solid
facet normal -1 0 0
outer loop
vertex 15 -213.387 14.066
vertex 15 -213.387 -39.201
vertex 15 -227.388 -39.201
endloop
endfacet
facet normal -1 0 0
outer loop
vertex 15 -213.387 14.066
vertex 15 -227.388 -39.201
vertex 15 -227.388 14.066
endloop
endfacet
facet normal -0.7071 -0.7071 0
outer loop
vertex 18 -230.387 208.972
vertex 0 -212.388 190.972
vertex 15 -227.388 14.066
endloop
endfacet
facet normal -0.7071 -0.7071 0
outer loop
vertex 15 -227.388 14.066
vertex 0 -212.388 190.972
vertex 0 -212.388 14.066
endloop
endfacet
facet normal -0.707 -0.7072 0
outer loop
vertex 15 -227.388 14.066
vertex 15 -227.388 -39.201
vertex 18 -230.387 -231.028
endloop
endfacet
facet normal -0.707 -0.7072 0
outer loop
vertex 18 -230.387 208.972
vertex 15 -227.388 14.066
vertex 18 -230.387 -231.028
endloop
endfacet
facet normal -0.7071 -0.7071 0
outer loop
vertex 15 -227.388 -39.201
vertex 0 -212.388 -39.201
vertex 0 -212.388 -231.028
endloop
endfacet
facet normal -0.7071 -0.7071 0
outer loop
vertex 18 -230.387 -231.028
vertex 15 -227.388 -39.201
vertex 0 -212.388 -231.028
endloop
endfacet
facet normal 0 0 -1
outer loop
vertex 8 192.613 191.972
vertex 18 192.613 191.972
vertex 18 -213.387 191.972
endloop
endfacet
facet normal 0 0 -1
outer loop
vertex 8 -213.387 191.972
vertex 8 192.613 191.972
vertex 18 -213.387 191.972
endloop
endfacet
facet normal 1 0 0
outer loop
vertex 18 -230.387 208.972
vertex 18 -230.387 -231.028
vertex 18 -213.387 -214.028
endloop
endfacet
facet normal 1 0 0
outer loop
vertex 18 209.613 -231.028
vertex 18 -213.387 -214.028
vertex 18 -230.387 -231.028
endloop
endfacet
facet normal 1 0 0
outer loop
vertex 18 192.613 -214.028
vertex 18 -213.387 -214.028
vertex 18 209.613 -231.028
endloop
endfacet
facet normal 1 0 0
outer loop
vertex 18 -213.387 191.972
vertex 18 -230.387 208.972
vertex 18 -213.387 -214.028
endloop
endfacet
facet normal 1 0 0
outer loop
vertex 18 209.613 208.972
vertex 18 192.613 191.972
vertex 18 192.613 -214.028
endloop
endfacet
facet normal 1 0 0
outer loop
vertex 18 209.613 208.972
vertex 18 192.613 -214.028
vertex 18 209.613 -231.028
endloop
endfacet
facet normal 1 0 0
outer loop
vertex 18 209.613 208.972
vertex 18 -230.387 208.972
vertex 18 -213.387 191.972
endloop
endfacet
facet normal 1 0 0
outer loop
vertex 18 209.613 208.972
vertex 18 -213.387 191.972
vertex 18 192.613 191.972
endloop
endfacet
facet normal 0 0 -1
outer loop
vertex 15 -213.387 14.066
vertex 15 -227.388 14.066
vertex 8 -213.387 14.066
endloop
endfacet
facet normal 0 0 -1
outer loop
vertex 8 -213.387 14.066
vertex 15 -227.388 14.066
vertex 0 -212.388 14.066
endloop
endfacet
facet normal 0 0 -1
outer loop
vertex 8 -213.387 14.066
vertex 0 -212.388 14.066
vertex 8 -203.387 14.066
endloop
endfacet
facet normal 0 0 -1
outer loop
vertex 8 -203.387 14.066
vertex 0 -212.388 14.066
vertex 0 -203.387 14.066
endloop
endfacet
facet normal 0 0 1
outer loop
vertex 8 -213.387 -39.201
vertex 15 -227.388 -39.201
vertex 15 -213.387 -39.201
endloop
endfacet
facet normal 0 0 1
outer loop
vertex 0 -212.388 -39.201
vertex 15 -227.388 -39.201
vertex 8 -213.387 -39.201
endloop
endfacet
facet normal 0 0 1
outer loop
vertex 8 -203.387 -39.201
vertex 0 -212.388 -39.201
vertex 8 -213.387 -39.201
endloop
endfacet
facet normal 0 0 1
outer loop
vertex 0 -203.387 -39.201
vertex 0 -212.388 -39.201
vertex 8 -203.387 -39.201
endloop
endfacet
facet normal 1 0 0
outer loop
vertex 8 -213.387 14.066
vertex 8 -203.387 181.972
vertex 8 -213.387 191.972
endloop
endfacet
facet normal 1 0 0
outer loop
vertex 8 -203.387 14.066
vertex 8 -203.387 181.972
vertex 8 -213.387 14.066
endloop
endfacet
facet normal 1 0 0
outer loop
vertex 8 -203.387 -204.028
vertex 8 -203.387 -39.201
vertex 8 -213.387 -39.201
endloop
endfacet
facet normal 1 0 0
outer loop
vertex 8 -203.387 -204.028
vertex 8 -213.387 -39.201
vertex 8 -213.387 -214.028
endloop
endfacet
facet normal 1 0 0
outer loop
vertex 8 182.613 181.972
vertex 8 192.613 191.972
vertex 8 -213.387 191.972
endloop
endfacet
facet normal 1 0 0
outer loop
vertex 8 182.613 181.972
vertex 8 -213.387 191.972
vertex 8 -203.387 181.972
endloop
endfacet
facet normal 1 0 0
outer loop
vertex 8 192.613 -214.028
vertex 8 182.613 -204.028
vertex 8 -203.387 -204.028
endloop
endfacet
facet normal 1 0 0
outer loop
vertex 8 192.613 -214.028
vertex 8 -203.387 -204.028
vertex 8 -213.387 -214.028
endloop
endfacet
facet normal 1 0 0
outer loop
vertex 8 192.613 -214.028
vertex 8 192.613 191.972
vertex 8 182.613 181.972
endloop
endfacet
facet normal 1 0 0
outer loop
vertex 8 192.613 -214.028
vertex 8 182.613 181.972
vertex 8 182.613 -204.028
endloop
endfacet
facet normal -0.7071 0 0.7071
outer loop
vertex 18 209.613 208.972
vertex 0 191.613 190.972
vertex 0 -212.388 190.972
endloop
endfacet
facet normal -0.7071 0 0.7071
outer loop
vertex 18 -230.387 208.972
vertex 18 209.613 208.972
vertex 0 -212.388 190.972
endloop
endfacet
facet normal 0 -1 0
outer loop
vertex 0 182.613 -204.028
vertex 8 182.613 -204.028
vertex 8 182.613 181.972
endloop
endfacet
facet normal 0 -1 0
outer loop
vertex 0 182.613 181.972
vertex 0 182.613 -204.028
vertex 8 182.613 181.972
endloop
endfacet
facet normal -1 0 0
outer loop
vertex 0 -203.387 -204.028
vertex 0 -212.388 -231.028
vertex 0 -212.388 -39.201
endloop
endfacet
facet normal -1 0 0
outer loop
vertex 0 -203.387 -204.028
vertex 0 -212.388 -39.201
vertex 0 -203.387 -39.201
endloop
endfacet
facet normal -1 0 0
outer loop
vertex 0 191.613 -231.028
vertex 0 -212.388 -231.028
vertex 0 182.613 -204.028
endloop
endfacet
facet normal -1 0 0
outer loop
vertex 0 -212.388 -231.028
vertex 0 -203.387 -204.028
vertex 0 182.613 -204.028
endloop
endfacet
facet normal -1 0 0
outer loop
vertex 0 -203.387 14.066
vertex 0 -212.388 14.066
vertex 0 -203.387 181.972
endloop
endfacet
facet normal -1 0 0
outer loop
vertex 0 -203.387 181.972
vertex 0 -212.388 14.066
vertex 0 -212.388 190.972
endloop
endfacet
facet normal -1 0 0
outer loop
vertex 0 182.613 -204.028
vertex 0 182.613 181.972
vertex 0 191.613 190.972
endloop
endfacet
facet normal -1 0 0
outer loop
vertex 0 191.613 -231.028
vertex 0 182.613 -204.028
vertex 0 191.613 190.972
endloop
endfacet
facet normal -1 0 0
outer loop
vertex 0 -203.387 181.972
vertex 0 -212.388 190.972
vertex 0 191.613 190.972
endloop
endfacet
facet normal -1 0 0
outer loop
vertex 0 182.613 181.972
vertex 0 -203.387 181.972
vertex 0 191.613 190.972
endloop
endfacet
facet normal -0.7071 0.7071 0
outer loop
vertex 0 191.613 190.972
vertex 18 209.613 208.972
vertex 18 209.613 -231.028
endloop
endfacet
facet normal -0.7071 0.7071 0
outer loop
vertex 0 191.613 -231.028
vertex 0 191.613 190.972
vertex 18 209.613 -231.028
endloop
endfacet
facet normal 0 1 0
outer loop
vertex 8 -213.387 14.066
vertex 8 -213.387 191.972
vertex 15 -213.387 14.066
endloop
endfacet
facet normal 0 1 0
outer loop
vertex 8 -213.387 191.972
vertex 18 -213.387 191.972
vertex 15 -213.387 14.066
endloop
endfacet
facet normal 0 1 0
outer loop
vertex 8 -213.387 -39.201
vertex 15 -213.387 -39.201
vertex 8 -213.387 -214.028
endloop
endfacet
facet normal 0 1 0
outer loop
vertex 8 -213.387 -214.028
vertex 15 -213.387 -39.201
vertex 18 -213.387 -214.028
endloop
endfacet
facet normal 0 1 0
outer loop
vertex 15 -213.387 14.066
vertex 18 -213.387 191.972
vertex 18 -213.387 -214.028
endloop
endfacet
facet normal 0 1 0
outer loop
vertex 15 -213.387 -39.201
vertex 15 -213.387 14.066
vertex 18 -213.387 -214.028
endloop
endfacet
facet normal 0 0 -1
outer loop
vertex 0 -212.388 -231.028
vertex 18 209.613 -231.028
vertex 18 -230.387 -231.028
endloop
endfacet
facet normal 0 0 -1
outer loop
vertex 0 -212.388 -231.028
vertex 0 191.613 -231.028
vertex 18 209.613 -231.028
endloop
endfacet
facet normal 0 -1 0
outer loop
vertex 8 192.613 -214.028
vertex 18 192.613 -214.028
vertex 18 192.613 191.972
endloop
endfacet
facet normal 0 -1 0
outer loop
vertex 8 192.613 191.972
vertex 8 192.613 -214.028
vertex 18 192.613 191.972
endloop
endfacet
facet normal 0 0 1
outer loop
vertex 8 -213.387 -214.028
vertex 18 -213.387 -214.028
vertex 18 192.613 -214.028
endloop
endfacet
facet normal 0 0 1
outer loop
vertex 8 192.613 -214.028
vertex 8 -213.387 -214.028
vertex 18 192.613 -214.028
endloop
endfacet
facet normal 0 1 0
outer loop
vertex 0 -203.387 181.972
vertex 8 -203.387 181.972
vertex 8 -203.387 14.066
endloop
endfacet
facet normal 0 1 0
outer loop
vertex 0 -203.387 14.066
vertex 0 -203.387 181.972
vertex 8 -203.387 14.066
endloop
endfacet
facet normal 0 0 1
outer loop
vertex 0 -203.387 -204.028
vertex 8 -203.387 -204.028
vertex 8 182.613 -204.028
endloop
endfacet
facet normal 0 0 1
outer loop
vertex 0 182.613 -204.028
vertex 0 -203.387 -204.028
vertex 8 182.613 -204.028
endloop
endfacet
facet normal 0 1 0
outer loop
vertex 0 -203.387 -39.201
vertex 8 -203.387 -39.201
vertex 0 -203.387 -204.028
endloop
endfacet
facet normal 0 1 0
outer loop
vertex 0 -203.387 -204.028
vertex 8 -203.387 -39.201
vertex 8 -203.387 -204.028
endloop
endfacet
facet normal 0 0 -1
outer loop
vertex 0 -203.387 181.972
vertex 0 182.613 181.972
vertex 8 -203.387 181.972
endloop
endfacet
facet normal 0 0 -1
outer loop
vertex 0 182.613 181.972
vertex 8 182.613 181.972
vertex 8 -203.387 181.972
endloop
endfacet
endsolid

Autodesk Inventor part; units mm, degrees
ref_plane "YZ Plane" through (0, 0, 0) normal (1, 0, 0) x (0, 1, 0)
ref_plane "XZ Plane" through (0, 0, 0) normal (0, 1, 0) x (-1, 0, 0)
ref_plane "XY Plane" through (0, 0, 0) normal (0, 0, 1) x (1, 0, 0)
sketch "Skizze1" plane through (0, 0, 0) normal (1, 0, 0) x (0, 1, 0)
  line L0 (-230.3873, 208.9718) -> (209.6127, 208.9718)
  line L1 (209.6127, 208.9718) -> (209.6127, -231.0282)
  line L2 (209.6127, -231.0282) -> (-230.3873, -231.0282)
  line L3 (-230.3873, -231.0282) -> (-230.3873, 208.9718)
  point P0 (0, 0)
  dimension "d0" = 440
  dimension "d1" = 440
extrude "Extrusion1" add sketch "Skizze1" along normal blind 18
sketch "Skizze2" plane through (18, 0, 0) normal (1, 0, 0) x (0, 0, -1)
  line L0 (-208.9718, 209.6127) -> (-208.9718, -230.3873) projected
  line L1 (-208.9718, -230.3873) -> (231.0282, -230.3873) projected
  line L2 (231.0282, -230.3873) -> (231.0282, 209.6127) projected
  line L3 (231.0282, 209.6127) -> (-208.9718, 209.6127) projected
  line L4 (-191.9718, -213.3873) -> (214.0282, -213.3873)
  line L5 (214.0282, -213.3873) -> (214.0282, 192.6127)
  line L6 (214.0282, 192.6127) -> (-191.9718, 192.6127)
  line L7 (-191.9718, 192.6127) -> (-191.9718, -213.3873)
  point P0 (0, 0)
  dimension "d4" = 17
  dimension "d5" = 17
  dimension "d6" = 17
  dimension "d7" = 17
extrude "Extrusion2" cut sketch "Skizze2" against normal blind 10 contours L7 L6 L5 L4
sketch "Skizze3" plane through (8, 0, 0) normal (1, 0, 0) x (0, 0, -1)
  line L0 (214.0282, -213.3873) -> (-191.9718, -213.3873) projected
  line L1 (214.0282, 192.6127) -> (214.0282, -213.3873) projected
  line L2 (-191.9718, 192.6127) -> (214.0282, 192.6127) projected
  line L3 (-191.9718, -213.3873) -> (-191.9718, 192.6127) projected
  line L4 (-181.9718, -203.3873) -> (204.0282, -203.3873)
  line L5 (204.0282, -203.3873) -> (204.0282, 182.6127)
  line L6 (204.0282, 182.6127) -> (-181.9718, 182.6127)
  line L7 (-181.9718, 182.6127) -> (-181.9718, -203.3873)
  point P0 (0, 0)
  dimension "d10" = 10
  dimension "d11" = 10
  dimension "d12" = 10
  dimension "d13" = 10
extrude "Extrusion3" cut sketch "Skizze3" against normal blind 8 contours L7 L6 L5 L4
sketch "Skizze6" plane through (0, 0, 0) normal (-1, 0, 0) x (0, 0, 1)
  line L0 (-204.0282, -203.3873) -> (-204.0282, 182.6127) projected
  line L1 (-204.0282, 182.6127) -> (181.9718, 182.6127) projected
  line L2 (181.9718, 182.6127) -> (181.9718, -203.3873) projected
  line L3 (181.9718, -203.3873) -> (-204.0282, -203.3873) projected
  line L4 (208.9718, -230.3873) -> (208.9718, 209.6127) projected
  line L5 (208.9718, 209.6127) -> (-231.0282, 209.6127) projected
  line L6 (-231.0282, 209.6127) -> (-231.0282, -230.3873) projected
  line L7 (-231.0282, -230.3873) -> (208.9718, -230.3873) projected
  line L8 (6.4718, -214.3873) -> (6.4718, -223.3873) projected
  line L9 (10.9718, -214.3873) -> (6.4718, -214.3873) projected
  line L10 (6.4718, -223.3873) -> (1.9718, -223.3873) projected
  line L11 (1.9718, -210.3873) -> (1.9718, -223.3873) projected
  line L12 (10.9718, -210.3873) -> (10.9718, -214.3873) projected
  line L13 (-211.0282, -210.3873) -> (188.9718, -210.3873) projected
  line L14 (-0.0282, -210.3873) -> (-0.0282, -223.3873) projected
  line L15 (-9.0282, -210.3873) -> (-9.0282, -214.3873) projected
  line L16 (-4.5282, -214.3873) -> (-9.0282, -214.3873) projected
  line L17 (-4.5282, -214.3873) -> (-4.5282, -223.3873) projected
  line L18 (-0.0282, -223.3873) -> (-4.5282, -223.3873) projected
  line L19 (-16.0282, -210.3873) -> (-16.0282, -214.3873) projected
  line L20 (-16.0282, -214.3873) -> (-20.5282, -214.3873) projected
  line L21 (-20.5282, -214.3873) -> (-20.5282, -223.3873) projected
  line L22 (-20.5282, -223.3873) -> (-25.0282, -223.3873) projected
  line L23 (-25.0282, -210.3873) -> (-25.0282, -223.3873) projected
  line L24 (-27.0282, -210.3873) -> (-27.0282, -223.3873) projected
  line L25 (-27.0282, -223.3873) -> (-31.5282, -223.3873) projected
  line L26 (-31.5282, -214.3873) -> (-31.5282, -223.3873) projected
  line L27 (-31.5282, -214.3873) -> (-36.0282, -214.3873) projected
  line L28 (-36.0282, -210.3873) -> (-36.0282, -214.3873) projected
  line L29 (-231.0282, -230.3873) -> (208.9718, -230.3873) projected
  line L30 (14.0665, -230.3873) -> (14.0665, -203.3873)
  line L31 (-39.201, -230.3873) -> (-39.201, -203.3873)
  point P0 (0, 0)
extrude "Extrusion4" cut sketch "Skizze6" against normal blind 15 contours L3 L30 L13 L31 | L13 L28 L27 L26 L25 L24 L23 L22 L21 L20 L19 L15 L16 L17 L18 L14 L11 L10 L8 L9 L12 L30 L7 L31 | L13 L24 L25 L26 L27 L28 | L12 L9 L8 L10 L11 L13 | L13 L19 L20 L21 L22 L23 | L14 L18 L17 L16 L15 L13
chamfer "Fase1" distance 18 angle 45 1 edges at (0, -230.3873, 111.5191)
chamfer "Fase2" distance 18 angle 45 2 edges at (0, 209.6127, -11.0282) (0, -1.3876, 208.9718)
properties part number "PV_Rahmen_CPY2"
